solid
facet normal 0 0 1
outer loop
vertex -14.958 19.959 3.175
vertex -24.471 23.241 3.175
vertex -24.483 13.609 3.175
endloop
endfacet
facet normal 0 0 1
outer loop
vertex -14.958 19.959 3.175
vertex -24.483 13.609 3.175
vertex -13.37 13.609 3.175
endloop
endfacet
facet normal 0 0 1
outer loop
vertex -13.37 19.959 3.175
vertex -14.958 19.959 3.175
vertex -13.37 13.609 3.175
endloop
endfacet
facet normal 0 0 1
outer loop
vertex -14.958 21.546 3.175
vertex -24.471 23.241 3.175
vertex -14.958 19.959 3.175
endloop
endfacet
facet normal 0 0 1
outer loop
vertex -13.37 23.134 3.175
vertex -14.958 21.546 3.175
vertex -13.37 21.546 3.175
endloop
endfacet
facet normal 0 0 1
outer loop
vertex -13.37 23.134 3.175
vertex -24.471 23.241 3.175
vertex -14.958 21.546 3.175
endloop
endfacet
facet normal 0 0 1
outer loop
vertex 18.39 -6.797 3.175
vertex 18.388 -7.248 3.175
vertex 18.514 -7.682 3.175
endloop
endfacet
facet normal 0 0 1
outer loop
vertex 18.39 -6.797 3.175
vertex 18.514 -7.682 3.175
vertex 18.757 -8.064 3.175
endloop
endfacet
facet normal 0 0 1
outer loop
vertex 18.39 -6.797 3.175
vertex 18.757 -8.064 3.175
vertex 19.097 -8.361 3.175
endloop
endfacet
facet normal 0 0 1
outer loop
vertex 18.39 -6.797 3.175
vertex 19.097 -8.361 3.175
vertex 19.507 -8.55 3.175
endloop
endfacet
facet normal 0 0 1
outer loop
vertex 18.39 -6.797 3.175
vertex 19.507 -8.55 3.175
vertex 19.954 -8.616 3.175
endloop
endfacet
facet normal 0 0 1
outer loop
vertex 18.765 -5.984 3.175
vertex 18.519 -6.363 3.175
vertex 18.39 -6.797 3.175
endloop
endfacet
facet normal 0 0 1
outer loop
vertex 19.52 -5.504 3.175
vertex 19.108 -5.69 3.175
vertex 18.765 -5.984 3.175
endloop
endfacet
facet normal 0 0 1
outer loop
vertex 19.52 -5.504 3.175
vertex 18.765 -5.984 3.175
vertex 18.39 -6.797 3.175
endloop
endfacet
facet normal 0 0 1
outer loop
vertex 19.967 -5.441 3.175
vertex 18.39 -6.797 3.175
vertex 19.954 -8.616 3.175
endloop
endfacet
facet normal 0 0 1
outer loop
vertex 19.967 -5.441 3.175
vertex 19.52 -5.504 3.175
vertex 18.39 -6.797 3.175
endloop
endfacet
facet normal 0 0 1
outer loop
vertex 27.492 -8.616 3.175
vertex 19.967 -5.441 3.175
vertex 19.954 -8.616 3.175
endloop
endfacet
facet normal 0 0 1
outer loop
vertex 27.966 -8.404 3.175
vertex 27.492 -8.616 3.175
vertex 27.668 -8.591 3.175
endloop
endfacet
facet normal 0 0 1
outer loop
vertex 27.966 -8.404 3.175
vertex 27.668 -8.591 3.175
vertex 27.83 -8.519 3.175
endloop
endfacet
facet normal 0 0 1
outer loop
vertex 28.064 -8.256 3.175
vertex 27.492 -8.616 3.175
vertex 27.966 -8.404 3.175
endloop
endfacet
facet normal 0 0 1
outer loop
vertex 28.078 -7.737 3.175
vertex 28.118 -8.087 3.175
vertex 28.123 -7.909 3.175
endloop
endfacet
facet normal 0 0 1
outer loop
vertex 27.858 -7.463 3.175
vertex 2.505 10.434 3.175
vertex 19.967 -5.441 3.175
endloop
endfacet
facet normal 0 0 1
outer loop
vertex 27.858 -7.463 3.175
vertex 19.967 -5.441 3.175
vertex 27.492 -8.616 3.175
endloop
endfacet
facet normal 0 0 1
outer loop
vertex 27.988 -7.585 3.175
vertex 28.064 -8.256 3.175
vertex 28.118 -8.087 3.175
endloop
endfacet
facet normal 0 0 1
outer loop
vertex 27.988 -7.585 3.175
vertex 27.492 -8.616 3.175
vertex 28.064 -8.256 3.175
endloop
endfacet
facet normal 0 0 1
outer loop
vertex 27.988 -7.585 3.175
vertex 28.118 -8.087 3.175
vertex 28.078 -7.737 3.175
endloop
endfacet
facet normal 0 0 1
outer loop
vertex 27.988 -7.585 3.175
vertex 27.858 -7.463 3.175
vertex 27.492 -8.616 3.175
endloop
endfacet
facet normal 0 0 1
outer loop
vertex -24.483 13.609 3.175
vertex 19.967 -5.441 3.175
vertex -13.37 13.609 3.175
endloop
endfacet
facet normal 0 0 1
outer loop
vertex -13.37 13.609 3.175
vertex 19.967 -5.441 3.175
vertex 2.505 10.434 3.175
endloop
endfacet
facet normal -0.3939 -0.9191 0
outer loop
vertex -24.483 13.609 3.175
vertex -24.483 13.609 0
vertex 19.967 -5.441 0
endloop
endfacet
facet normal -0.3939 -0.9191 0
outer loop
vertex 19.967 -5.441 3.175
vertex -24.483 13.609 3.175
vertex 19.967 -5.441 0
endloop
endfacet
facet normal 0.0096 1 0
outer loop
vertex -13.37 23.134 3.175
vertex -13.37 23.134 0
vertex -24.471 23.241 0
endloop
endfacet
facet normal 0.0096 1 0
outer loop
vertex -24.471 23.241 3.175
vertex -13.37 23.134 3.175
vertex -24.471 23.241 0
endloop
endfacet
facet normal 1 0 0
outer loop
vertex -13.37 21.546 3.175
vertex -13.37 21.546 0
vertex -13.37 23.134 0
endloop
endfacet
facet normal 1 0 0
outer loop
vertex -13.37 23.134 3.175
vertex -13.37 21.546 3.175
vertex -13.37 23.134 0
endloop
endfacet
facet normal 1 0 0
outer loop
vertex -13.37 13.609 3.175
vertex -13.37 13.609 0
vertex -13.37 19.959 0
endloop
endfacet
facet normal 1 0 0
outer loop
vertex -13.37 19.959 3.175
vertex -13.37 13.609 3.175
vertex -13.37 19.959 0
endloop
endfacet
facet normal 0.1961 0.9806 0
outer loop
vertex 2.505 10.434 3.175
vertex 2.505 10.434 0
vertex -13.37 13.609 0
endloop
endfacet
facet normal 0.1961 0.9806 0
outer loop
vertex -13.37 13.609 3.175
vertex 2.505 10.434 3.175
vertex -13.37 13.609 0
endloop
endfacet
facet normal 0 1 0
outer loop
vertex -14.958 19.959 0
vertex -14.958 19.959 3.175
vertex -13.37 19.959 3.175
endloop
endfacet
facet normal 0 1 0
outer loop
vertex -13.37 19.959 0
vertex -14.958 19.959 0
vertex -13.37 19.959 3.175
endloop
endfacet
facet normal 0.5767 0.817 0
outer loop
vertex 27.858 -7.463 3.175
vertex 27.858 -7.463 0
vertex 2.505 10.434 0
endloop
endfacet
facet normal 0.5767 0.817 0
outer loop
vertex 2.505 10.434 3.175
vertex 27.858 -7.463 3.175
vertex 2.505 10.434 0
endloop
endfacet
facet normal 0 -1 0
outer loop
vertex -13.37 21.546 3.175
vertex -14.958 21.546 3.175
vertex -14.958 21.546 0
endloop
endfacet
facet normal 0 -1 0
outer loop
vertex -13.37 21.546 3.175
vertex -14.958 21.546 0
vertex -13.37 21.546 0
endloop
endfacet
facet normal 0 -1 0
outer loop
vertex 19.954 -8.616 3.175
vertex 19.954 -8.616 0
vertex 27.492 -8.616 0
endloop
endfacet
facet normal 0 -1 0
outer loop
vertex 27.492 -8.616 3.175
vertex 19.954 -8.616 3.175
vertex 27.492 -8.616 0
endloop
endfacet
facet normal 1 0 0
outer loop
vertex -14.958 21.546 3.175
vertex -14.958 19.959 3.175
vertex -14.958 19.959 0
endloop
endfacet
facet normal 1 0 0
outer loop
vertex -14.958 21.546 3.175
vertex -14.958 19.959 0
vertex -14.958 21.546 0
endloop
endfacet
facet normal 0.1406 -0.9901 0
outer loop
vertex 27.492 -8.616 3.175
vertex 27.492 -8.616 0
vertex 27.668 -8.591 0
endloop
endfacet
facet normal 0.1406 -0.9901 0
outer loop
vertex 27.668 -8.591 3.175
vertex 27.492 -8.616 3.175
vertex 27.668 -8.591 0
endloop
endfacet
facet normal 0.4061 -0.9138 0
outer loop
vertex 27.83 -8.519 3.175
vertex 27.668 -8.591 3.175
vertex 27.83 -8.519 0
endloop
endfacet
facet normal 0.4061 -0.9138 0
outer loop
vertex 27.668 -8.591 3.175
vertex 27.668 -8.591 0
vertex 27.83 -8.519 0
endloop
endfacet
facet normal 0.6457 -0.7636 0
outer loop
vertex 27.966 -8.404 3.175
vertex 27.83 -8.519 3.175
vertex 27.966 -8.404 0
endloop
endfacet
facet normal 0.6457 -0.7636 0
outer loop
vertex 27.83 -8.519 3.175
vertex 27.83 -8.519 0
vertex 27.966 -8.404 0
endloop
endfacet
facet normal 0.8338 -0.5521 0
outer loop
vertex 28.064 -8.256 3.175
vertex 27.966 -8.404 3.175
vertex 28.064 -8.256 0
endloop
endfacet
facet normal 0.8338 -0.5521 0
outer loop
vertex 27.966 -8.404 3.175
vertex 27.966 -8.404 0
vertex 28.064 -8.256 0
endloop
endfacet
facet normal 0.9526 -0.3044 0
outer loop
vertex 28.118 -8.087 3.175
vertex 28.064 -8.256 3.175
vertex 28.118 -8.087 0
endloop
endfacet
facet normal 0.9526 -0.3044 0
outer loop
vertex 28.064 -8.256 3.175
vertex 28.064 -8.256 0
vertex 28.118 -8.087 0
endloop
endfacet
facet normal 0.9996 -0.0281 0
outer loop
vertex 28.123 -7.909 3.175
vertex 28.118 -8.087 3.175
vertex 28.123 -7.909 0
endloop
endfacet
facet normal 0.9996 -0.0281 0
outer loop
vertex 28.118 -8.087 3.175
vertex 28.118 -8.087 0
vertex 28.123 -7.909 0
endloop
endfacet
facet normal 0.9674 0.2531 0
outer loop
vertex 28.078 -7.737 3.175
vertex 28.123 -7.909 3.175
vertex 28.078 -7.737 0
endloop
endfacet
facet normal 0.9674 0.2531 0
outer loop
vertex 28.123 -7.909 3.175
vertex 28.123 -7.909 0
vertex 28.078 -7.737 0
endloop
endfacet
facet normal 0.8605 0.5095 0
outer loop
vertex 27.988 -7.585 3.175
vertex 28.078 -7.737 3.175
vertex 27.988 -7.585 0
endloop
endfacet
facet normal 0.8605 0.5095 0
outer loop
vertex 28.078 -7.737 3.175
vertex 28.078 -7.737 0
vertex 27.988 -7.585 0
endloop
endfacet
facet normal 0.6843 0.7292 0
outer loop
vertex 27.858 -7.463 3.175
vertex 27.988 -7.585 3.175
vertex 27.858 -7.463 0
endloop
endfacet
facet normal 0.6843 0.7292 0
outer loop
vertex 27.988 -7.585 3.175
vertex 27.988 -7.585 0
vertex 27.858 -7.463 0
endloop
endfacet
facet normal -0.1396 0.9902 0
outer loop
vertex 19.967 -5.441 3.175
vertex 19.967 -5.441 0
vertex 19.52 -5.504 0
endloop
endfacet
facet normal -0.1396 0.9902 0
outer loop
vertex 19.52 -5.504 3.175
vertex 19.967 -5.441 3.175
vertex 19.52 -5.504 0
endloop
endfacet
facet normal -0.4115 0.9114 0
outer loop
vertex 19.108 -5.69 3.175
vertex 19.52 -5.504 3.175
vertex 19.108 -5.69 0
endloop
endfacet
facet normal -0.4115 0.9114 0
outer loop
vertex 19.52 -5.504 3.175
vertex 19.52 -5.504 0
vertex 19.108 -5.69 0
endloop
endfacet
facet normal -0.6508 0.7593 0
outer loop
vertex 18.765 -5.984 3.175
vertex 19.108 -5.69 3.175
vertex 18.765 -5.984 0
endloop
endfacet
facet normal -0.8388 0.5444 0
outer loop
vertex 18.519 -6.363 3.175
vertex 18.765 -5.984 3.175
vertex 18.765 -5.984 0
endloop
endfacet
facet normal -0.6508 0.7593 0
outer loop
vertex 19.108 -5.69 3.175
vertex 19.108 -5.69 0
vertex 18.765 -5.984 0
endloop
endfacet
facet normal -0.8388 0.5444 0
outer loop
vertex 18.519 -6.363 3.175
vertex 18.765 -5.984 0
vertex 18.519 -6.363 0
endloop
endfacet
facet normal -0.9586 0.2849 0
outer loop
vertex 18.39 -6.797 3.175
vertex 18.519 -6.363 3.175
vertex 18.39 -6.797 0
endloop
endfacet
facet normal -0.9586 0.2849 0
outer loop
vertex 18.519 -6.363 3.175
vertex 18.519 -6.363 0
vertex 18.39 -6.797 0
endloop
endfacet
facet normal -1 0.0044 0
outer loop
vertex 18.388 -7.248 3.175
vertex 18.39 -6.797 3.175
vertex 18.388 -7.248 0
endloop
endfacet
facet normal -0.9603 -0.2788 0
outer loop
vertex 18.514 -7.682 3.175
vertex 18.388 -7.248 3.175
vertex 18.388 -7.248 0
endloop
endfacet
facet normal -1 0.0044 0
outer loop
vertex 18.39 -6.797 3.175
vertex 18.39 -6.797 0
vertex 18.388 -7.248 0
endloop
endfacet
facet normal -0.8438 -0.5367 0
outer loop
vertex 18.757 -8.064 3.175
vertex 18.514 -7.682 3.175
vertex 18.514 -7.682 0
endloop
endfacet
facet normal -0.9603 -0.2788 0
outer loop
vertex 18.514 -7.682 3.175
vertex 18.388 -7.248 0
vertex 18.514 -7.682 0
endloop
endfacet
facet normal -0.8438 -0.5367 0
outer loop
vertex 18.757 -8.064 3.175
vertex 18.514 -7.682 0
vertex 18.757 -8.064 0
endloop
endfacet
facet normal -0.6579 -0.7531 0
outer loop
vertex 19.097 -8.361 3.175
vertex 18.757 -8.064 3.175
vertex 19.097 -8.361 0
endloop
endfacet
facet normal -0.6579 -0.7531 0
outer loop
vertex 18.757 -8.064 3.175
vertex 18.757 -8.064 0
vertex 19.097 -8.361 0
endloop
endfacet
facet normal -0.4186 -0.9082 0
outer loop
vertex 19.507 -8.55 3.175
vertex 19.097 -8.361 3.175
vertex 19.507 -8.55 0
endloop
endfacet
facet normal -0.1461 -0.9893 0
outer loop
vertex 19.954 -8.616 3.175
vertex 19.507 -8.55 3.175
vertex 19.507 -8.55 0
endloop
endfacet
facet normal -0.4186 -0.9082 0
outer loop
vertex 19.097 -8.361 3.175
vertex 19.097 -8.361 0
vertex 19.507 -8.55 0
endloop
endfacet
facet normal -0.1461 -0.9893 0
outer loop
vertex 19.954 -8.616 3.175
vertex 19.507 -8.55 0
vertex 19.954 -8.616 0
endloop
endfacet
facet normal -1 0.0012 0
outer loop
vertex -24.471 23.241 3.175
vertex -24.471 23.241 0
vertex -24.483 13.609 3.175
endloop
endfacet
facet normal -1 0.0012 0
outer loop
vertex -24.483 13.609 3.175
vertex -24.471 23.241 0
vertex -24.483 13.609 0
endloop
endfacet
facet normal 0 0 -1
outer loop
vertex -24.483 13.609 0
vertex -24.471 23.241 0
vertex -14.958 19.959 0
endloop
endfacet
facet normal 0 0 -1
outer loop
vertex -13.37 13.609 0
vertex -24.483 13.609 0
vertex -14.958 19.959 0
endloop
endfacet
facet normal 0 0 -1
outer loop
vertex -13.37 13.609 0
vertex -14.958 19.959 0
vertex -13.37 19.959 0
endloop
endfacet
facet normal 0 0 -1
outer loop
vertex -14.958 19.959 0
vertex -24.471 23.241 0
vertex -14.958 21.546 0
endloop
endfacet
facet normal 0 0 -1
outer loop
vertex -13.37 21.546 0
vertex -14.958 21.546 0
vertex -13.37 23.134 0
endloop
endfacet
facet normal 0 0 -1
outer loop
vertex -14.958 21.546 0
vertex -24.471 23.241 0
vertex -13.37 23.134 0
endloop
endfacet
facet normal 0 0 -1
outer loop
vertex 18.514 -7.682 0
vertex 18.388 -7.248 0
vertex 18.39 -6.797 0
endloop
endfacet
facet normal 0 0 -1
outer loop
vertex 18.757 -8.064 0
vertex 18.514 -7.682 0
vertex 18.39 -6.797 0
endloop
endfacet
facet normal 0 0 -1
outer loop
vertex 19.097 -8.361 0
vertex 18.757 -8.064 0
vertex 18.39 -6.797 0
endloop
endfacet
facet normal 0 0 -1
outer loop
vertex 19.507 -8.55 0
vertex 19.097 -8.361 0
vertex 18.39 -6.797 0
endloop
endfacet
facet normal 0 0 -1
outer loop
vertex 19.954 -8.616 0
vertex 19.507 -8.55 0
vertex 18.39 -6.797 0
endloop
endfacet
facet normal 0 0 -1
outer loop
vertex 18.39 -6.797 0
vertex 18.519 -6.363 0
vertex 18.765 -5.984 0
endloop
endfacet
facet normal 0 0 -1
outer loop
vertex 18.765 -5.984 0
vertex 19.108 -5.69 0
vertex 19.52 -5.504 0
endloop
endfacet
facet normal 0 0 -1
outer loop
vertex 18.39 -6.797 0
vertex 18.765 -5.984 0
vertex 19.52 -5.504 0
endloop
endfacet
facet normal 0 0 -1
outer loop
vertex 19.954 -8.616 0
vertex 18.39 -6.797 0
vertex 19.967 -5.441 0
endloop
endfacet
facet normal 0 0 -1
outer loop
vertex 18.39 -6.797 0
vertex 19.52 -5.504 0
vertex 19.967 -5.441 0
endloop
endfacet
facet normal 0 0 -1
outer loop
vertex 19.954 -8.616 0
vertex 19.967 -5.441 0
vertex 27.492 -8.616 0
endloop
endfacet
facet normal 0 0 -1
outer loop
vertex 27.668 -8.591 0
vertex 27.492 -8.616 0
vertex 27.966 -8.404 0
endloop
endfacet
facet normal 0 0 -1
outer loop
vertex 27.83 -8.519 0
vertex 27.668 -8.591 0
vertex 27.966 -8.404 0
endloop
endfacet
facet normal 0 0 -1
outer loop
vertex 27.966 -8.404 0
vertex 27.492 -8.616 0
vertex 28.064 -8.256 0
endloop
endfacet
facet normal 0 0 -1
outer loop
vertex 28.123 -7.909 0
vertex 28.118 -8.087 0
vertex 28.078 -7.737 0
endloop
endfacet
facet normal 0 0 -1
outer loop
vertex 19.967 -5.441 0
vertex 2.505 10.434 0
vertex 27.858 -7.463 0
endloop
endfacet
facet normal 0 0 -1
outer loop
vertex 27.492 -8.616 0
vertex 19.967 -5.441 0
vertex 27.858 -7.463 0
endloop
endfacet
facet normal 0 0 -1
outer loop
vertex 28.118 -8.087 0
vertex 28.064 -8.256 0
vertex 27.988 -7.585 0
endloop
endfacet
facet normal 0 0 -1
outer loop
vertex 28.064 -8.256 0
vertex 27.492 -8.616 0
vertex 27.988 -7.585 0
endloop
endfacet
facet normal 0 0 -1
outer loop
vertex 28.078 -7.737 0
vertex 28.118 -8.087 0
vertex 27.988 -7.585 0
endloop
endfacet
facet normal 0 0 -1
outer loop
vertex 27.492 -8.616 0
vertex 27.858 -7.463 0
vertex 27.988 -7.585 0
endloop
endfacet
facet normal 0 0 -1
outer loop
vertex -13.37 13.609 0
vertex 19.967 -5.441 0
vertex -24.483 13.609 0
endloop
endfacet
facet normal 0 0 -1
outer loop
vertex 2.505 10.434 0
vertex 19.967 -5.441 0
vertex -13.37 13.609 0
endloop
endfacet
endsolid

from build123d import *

# Parameters (mm, degrees)
BOSS_EXTRUDE1_DEPTH = 3.175
SKETCH2_W           = 1.5875
SKETCH2_H           = 1.5875
CUT_EXTRUDE1_DEPTH  = 3.175


with BuildPart() as part:
    # Sketch1 → Boss-Extrude1 (new body)
    with BuildSketch(Plane.XY):
        with BuildLine():
            Line((-24.470793716, 23.241427561), (-24.482874985, 13.608728252))
            Line((-24.482874985, 13.608728252), (19.967125015, -5.441271748))
            ThreePointArc((19.967125015, -5.441271748), (18.373232421, -7.022379153), (19.954339827, -8.616271748))
            Line((19.954339827, -8.616271748), (27.492125015, -8.616271748))
            ThreePointArc((27.492125015, -8.616271748), (28.097157471, -8.173526248), (27.858189288, -7.462905352))
            Line((27.858189288, -7.462905352), (2.504625015, 10.433728252))
            Line((2.504625015, 10.433728252), (-13.370374985, 13.608728252))
            Line((-13.370374985, 13.608728252), (-13.370374985, 23.133728252))
            Line((-13.370374985, 23.133728252), (-24.470793716, 23.241427561))
        make_face()
    extrude(amount=BOSS_EXTRUDE1_DEPTH)

    # Sketch2 → Cut-Extrude1 (cut)
    with BuildSketch(Plane.XY.offset(3.175)):
        with Locations((-14.164124985, 20.752478252)):
            Rectangle(SKETCH2_W, SKETCH2_H)
    extrude(amount=-CUT_EXTRUDE1_DEPTH, mode=Mode.SUBTRACT)


solid = part.part
